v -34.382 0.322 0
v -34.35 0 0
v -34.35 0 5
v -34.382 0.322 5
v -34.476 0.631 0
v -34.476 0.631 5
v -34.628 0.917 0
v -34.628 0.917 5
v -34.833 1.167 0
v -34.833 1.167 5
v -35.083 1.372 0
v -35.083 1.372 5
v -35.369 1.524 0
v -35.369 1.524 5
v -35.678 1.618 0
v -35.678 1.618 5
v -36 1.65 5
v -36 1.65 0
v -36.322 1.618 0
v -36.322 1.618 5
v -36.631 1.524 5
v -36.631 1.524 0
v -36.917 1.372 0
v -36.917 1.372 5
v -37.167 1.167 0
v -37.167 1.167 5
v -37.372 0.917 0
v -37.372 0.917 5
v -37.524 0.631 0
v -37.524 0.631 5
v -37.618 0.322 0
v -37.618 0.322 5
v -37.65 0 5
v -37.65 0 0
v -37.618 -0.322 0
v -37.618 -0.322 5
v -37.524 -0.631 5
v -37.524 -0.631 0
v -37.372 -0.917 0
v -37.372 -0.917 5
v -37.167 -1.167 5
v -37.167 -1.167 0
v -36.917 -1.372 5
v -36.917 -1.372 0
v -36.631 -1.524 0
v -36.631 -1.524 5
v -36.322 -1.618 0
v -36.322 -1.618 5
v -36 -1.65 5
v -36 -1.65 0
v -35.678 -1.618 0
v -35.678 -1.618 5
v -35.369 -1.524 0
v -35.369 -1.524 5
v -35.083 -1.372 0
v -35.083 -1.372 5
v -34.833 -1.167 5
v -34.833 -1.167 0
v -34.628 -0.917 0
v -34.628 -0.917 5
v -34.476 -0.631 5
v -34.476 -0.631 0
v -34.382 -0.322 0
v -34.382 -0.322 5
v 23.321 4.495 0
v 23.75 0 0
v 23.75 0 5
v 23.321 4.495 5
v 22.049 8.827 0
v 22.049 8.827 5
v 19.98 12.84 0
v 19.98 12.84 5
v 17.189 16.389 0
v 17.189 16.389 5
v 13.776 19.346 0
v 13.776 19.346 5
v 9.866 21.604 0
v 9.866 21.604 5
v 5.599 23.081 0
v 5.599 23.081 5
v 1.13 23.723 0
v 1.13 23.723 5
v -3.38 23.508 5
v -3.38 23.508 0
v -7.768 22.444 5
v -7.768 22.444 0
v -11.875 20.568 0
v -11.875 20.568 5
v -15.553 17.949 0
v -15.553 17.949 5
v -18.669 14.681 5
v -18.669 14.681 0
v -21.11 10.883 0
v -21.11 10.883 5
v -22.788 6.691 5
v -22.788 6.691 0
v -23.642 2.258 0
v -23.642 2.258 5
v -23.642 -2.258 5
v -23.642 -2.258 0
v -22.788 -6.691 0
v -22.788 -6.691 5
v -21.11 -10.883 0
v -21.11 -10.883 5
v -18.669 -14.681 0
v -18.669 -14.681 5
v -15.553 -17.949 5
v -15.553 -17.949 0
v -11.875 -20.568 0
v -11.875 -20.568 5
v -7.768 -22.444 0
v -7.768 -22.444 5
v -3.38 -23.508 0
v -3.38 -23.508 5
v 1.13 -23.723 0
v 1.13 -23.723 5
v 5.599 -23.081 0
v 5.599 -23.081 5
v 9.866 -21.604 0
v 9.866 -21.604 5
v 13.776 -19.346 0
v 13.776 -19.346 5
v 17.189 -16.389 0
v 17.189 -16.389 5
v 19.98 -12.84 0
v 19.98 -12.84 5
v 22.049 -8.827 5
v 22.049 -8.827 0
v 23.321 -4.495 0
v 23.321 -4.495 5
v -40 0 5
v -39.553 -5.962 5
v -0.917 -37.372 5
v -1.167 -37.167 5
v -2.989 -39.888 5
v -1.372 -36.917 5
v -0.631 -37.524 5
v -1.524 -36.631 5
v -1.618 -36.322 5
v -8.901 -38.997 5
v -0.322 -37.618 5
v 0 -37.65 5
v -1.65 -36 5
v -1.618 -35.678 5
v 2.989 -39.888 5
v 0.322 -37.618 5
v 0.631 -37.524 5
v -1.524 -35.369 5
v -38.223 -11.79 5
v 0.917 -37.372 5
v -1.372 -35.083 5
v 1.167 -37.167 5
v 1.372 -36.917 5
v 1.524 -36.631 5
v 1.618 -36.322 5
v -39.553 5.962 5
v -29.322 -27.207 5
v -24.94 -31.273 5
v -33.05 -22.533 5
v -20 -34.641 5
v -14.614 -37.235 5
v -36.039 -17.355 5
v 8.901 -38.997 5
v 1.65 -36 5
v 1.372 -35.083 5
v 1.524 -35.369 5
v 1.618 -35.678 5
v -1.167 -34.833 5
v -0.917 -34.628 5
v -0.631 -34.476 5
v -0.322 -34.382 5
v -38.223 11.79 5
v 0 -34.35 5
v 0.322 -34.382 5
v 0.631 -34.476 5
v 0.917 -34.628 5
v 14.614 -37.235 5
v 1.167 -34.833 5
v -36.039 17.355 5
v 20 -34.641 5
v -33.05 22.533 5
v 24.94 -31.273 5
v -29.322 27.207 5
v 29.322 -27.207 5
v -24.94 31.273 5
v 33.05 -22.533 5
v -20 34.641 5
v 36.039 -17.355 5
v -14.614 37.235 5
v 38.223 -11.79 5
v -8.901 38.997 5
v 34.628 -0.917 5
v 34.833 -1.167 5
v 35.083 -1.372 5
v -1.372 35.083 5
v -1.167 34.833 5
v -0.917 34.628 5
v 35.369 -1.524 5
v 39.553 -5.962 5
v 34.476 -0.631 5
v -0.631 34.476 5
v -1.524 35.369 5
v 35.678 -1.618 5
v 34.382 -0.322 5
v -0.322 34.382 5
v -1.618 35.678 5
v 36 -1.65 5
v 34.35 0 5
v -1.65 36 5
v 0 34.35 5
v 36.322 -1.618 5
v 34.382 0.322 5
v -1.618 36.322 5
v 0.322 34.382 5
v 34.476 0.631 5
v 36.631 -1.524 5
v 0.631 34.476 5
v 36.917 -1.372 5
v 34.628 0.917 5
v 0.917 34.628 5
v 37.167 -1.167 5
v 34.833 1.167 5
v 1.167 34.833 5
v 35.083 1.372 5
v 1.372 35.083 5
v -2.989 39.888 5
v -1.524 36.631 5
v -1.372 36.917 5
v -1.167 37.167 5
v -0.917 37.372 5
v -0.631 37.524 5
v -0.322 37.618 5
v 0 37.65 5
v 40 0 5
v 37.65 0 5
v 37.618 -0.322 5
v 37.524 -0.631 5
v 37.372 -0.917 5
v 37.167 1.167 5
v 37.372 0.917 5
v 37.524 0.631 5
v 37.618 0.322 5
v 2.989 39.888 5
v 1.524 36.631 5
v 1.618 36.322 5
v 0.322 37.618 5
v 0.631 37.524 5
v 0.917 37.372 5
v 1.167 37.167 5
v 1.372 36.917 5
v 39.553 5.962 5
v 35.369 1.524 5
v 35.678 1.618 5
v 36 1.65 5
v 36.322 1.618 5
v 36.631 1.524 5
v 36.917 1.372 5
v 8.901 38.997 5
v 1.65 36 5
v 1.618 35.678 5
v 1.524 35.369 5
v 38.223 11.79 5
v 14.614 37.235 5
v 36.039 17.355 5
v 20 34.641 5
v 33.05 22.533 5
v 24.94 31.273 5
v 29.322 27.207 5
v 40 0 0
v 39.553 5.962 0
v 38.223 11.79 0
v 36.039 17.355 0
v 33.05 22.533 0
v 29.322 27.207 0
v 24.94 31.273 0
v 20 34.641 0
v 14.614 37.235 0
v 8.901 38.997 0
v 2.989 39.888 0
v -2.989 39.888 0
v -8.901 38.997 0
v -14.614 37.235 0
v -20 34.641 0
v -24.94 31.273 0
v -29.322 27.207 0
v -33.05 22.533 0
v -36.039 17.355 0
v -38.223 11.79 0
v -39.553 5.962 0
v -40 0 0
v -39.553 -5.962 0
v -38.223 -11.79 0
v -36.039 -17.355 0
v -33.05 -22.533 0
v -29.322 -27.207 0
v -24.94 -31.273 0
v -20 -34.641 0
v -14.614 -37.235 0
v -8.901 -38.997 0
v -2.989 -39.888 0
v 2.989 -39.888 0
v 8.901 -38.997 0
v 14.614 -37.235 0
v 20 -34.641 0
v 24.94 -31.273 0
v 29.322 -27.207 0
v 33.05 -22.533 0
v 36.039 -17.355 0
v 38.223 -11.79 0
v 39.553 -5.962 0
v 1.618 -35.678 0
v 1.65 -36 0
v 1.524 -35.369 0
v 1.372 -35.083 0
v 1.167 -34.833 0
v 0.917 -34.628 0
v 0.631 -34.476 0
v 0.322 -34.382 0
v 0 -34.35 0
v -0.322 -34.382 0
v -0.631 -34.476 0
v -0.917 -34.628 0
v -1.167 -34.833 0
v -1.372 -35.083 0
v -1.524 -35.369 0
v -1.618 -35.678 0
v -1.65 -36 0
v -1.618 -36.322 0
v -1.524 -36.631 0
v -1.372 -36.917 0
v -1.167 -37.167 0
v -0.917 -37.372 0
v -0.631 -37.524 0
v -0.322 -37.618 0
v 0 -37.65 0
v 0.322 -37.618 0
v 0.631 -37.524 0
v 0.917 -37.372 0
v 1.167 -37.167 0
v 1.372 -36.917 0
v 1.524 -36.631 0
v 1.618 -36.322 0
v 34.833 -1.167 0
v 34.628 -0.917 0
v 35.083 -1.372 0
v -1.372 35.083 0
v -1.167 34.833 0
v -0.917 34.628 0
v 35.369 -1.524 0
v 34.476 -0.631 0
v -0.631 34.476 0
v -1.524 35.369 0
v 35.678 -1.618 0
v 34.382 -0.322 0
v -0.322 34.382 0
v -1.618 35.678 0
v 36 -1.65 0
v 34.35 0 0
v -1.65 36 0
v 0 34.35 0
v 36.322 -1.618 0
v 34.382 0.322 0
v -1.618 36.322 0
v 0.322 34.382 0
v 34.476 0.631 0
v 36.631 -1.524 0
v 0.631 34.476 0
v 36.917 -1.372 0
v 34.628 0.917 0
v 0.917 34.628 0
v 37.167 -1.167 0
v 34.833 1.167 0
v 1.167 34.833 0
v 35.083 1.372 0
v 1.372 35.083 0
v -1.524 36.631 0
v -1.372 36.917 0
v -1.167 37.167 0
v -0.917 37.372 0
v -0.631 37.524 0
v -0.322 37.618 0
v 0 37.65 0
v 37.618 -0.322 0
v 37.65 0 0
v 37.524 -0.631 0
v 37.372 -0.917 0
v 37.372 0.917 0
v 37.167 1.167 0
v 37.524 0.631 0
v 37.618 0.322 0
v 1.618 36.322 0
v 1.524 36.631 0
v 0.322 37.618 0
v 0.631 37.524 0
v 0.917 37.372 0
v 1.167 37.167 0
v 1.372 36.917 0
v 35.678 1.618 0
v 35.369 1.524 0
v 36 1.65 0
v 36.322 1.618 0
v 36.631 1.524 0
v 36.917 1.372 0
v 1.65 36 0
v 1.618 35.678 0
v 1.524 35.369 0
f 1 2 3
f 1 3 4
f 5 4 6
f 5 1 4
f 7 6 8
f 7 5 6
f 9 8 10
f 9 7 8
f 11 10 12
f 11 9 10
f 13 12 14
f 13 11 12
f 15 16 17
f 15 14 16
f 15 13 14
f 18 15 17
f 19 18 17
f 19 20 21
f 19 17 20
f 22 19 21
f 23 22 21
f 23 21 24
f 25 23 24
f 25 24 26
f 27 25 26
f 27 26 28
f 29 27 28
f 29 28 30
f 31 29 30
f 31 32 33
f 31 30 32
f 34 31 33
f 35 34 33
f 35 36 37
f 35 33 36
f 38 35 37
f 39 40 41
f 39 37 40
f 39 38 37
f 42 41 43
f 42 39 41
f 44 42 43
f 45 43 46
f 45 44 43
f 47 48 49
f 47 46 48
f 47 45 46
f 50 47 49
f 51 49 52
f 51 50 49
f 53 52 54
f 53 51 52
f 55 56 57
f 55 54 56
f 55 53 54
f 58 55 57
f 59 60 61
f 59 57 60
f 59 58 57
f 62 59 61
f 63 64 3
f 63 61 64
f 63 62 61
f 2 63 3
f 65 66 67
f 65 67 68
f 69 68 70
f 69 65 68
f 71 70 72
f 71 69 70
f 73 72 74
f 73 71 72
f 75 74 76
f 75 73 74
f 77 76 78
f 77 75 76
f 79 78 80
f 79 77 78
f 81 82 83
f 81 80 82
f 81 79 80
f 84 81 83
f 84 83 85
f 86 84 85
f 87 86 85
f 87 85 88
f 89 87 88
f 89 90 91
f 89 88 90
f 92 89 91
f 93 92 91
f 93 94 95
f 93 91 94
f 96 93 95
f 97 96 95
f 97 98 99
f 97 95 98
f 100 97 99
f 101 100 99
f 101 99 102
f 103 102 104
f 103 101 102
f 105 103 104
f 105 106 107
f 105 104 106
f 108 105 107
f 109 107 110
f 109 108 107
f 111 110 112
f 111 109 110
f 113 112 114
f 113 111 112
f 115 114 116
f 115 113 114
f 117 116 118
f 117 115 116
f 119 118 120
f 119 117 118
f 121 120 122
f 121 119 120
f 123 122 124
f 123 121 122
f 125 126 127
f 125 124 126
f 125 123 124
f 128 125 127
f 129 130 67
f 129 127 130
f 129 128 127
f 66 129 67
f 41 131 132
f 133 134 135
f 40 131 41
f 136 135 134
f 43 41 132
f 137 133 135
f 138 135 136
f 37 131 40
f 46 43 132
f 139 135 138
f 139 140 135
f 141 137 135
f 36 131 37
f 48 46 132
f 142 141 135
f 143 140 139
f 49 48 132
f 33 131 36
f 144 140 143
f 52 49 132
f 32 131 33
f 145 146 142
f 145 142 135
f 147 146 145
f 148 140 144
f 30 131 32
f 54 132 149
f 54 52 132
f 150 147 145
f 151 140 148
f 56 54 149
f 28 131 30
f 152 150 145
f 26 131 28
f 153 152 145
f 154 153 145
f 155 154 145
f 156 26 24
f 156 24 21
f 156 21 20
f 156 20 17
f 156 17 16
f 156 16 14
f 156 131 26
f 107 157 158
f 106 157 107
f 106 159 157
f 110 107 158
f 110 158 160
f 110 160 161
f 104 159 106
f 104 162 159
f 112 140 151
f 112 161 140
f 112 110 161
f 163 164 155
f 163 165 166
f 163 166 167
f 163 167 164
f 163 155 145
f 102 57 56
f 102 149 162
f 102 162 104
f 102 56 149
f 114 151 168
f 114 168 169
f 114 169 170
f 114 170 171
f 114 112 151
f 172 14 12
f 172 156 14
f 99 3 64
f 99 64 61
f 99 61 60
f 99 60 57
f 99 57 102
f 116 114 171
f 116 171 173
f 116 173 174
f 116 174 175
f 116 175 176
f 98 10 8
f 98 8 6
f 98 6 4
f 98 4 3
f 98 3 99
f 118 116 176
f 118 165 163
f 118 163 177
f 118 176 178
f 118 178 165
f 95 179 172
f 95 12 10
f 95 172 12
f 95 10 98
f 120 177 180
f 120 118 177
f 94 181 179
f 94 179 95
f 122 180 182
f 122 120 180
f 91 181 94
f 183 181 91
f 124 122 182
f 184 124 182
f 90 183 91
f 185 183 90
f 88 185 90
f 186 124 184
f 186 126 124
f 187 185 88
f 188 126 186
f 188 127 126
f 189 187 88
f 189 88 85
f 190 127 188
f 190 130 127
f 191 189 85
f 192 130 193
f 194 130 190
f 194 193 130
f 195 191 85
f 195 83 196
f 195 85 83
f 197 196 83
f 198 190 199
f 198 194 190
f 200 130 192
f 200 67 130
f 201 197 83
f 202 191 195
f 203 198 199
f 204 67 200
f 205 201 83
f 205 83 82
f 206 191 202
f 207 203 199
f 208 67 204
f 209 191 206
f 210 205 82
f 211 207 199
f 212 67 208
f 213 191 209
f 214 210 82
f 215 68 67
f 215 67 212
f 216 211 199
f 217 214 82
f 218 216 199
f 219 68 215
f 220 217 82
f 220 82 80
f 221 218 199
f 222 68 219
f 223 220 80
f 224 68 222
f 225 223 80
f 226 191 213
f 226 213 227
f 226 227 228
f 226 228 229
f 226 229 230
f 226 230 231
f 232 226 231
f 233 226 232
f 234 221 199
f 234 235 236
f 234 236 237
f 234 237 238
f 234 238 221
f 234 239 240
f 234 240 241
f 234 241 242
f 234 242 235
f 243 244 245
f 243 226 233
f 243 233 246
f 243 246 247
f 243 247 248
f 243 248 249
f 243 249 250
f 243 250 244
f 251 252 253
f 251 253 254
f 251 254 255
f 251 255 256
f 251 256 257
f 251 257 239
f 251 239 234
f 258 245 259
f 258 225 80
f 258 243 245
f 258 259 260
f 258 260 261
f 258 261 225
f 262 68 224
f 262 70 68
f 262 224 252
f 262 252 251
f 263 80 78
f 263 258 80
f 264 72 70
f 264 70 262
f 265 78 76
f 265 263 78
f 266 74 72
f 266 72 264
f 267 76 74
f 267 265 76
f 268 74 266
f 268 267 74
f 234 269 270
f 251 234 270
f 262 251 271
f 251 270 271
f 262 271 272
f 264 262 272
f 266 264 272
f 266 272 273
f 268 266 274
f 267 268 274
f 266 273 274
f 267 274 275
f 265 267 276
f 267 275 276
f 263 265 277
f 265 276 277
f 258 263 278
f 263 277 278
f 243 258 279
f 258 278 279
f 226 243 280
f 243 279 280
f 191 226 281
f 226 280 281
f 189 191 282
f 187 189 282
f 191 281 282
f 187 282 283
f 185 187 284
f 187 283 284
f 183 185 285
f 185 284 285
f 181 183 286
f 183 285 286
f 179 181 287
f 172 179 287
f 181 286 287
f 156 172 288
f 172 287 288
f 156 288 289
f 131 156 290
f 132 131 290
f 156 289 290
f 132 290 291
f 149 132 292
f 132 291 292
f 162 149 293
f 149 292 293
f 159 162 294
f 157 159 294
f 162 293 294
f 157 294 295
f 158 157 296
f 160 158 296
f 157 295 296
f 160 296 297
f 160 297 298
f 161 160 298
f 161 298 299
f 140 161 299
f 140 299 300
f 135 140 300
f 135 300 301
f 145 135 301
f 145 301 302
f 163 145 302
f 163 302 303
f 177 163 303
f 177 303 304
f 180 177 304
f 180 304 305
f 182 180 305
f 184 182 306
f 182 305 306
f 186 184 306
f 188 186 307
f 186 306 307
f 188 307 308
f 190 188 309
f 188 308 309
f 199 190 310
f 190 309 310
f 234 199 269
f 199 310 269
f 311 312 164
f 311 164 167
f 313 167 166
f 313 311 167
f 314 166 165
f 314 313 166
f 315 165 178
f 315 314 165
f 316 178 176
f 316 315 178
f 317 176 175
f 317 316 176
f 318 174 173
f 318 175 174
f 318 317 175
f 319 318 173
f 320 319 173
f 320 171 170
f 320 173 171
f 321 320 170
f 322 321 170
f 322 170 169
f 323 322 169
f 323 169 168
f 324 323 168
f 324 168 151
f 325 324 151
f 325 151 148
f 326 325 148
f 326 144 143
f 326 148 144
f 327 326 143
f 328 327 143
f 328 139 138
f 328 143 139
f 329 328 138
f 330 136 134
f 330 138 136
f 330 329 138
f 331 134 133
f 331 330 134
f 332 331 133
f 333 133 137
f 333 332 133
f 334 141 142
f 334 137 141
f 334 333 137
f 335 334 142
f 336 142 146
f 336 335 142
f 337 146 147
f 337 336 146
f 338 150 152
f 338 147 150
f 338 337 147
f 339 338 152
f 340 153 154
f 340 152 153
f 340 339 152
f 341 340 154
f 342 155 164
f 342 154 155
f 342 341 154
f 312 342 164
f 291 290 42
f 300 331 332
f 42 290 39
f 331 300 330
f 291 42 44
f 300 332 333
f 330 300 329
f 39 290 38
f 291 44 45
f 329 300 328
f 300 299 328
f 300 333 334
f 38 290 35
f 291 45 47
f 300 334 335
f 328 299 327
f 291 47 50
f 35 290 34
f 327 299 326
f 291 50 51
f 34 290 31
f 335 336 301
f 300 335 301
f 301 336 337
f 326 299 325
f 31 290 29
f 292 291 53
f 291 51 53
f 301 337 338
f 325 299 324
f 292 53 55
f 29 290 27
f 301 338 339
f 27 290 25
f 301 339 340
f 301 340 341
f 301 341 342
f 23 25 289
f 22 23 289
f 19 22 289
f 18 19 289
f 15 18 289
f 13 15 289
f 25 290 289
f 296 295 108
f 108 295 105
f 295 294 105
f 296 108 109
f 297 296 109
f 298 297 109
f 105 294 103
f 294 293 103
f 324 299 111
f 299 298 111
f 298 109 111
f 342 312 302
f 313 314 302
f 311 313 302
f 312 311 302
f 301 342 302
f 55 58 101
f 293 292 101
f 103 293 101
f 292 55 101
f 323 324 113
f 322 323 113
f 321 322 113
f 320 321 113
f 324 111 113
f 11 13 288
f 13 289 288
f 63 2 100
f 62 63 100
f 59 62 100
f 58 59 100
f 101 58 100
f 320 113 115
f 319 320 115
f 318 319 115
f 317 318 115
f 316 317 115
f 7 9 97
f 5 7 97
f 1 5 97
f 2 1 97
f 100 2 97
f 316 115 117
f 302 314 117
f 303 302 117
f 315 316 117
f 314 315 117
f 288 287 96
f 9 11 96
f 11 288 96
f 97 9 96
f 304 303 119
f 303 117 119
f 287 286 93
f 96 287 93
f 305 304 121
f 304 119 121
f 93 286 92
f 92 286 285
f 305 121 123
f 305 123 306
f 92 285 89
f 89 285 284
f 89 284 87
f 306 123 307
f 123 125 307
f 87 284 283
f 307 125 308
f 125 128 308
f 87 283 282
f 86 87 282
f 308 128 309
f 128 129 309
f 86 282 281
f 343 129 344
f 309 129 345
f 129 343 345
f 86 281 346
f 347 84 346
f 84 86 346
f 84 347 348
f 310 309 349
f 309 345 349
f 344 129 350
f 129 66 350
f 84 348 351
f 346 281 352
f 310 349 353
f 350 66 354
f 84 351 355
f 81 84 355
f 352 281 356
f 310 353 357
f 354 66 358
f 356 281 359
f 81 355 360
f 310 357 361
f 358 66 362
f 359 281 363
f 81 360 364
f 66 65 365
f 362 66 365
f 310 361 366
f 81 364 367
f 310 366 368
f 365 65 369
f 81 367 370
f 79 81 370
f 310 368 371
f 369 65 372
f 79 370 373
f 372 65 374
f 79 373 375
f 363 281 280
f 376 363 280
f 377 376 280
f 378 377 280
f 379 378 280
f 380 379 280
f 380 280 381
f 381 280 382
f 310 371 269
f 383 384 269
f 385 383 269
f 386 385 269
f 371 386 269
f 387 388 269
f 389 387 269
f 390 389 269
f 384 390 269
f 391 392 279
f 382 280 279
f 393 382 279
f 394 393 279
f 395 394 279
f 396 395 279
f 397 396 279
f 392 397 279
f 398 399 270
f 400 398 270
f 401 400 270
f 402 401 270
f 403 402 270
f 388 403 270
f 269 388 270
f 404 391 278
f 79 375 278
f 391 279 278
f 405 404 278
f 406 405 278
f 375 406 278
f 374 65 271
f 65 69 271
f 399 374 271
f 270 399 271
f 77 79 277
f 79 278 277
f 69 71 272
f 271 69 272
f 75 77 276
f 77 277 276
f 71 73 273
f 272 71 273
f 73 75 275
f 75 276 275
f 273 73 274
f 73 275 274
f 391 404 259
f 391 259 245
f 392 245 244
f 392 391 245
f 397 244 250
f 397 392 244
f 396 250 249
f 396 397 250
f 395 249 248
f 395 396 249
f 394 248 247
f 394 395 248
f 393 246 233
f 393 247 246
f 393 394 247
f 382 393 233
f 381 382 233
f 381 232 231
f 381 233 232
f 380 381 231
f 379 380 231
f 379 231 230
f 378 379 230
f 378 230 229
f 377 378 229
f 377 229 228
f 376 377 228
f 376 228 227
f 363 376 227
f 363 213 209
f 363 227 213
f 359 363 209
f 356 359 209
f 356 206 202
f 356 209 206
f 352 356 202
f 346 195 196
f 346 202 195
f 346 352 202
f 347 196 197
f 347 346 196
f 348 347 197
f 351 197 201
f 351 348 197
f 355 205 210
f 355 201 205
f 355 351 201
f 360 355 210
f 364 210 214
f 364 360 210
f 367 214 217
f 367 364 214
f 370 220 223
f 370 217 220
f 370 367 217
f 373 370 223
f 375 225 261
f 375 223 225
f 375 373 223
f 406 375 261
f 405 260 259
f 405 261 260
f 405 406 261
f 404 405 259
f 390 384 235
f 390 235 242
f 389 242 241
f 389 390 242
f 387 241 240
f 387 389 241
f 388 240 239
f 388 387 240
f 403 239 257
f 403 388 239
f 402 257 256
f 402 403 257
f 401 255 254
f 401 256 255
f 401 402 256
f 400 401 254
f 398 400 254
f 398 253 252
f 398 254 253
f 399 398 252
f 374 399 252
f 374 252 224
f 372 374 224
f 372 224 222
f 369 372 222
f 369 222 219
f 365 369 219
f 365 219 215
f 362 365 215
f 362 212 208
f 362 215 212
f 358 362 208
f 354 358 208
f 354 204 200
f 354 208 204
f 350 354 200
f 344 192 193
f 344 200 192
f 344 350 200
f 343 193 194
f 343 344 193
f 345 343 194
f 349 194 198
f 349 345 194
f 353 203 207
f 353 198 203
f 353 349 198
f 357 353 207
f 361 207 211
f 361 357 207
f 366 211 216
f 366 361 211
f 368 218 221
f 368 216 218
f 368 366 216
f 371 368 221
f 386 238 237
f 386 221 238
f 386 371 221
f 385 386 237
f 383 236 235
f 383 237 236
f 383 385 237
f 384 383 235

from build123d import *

# Parameters (mm, degrees)
ESKIZ_KONTUR_R        = 40
PLASTINA_DEPTH        = 5
OTVERSTIYA_DEPTH      = 57.789083458
OTVERSTIYA_DEPTH_BACK = 57.789083458
ESKIZ_OTVERSTIYA_R    = 1.65
ESKIZ_OTVERSTIYA_R_2  = 23.75


with BuildPart() as part:
    # Eskiz_kontur → Plastina (new body)
    with BuildSketch(Plane.XY):
        Circle(ESKIZ_KONTUR_R)
    extrude(amount=PLASTINA_DEPTH)

    # Eskiz_otverstiya → Otverstiya (cut, two sides: drawn at the far end of the back side and taken through both)
    with BuildSketch(Plane.XY.offset(-OTVERSTIYA_DEPTH_BACK)):
        with Locations((0, -36)):
            Circle(ESKIZ_OTVERSTIYA_R)
        Circle(ESKIZ_OTVERSTIYA_R_2)
        with Locations((-36, 0)):
            Circle(ESKIZ_OTVERSTIYA_R)
        with Locations((36, 0)):
            Circle(ESKIZ_OTVERSTIYA_R)
        with Locations((0, 36)):
            Circle(ESKIZ_OTVERSTIYA_R)
    extrude(amount=OTVERSTIYA_DEPTH + OTVERSTIYA_DEPTH_BACK, mode=Mode.SUBTRACT)


solid = part.part
